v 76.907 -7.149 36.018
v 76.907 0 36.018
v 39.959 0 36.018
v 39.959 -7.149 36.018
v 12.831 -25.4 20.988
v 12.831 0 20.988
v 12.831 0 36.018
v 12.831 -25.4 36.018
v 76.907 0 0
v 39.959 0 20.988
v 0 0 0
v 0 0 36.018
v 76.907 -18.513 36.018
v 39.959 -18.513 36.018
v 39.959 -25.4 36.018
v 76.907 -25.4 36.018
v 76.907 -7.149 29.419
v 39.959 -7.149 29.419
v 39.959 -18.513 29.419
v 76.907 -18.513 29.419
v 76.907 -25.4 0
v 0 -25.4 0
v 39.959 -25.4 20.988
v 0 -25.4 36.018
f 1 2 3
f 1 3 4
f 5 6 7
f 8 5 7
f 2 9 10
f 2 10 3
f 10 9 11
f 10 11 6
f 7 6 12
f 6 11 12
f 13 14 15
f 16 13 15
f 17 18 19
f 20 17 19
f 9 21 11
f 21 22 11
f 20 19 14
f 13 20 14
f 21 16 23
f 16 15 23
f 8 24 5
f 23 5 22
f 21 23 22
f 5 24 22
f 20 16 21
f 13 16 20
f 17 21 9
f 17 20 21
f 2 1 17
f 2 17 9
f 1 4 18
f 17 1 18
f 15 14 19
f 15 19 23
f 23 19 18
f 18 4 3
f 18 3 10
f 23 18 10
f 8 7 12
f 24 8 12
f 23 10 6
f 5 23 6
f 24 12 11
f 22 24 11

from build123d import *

# Parameters (mm, degrees)
F1_DEPTH = 25.4
F3_DEPTH = 25.4
F4_DEPTH = 25.4


with BuildPart() as f1:
    # F0 (on Front) → F1 (new body)
    with BuildSketch(Plane.XZ):
        Polygon((12.8309270367, 36.0182486475), (0, 36.0182486475), (0, 0), (51.5070110559, 0), (51.5070110559, 36.0182486475), (39.9591773748, 36.0182486475), (39.9591773748, 20.9877323359), (12.8309270367, 20.9877323359), align=None)
    extrude(amount=F1_DEPTH)

    # F2 (on face) → F3 (join)
    with BuildSketch(Plane.YZ.offset(51.5070110559)):
        Polygon((-18.5131952167, 29.4194854796), (-18.5131952167, 36.0182486475), (-25.4, 36.0182486475), (-25.4, 0), (0, 0), (0, 36.0182486475), (-7.1486602537, 36.0182486475), (-7.1486602537, 29.4194854796), align=None)
    extrude(amount=F3_DEPTH)

    # F4 (cut): a face of the model
    f4_faces = [f1.faces().sort_by_distance(p)[0] for p in [
        (51.5070110559, -12.8309277352, 32.7188670635),
    ]]
    extrude(f4_faces, amount=-F4_DEPTH, mode=Mode.SUBTRACT)


solid = f1.part
